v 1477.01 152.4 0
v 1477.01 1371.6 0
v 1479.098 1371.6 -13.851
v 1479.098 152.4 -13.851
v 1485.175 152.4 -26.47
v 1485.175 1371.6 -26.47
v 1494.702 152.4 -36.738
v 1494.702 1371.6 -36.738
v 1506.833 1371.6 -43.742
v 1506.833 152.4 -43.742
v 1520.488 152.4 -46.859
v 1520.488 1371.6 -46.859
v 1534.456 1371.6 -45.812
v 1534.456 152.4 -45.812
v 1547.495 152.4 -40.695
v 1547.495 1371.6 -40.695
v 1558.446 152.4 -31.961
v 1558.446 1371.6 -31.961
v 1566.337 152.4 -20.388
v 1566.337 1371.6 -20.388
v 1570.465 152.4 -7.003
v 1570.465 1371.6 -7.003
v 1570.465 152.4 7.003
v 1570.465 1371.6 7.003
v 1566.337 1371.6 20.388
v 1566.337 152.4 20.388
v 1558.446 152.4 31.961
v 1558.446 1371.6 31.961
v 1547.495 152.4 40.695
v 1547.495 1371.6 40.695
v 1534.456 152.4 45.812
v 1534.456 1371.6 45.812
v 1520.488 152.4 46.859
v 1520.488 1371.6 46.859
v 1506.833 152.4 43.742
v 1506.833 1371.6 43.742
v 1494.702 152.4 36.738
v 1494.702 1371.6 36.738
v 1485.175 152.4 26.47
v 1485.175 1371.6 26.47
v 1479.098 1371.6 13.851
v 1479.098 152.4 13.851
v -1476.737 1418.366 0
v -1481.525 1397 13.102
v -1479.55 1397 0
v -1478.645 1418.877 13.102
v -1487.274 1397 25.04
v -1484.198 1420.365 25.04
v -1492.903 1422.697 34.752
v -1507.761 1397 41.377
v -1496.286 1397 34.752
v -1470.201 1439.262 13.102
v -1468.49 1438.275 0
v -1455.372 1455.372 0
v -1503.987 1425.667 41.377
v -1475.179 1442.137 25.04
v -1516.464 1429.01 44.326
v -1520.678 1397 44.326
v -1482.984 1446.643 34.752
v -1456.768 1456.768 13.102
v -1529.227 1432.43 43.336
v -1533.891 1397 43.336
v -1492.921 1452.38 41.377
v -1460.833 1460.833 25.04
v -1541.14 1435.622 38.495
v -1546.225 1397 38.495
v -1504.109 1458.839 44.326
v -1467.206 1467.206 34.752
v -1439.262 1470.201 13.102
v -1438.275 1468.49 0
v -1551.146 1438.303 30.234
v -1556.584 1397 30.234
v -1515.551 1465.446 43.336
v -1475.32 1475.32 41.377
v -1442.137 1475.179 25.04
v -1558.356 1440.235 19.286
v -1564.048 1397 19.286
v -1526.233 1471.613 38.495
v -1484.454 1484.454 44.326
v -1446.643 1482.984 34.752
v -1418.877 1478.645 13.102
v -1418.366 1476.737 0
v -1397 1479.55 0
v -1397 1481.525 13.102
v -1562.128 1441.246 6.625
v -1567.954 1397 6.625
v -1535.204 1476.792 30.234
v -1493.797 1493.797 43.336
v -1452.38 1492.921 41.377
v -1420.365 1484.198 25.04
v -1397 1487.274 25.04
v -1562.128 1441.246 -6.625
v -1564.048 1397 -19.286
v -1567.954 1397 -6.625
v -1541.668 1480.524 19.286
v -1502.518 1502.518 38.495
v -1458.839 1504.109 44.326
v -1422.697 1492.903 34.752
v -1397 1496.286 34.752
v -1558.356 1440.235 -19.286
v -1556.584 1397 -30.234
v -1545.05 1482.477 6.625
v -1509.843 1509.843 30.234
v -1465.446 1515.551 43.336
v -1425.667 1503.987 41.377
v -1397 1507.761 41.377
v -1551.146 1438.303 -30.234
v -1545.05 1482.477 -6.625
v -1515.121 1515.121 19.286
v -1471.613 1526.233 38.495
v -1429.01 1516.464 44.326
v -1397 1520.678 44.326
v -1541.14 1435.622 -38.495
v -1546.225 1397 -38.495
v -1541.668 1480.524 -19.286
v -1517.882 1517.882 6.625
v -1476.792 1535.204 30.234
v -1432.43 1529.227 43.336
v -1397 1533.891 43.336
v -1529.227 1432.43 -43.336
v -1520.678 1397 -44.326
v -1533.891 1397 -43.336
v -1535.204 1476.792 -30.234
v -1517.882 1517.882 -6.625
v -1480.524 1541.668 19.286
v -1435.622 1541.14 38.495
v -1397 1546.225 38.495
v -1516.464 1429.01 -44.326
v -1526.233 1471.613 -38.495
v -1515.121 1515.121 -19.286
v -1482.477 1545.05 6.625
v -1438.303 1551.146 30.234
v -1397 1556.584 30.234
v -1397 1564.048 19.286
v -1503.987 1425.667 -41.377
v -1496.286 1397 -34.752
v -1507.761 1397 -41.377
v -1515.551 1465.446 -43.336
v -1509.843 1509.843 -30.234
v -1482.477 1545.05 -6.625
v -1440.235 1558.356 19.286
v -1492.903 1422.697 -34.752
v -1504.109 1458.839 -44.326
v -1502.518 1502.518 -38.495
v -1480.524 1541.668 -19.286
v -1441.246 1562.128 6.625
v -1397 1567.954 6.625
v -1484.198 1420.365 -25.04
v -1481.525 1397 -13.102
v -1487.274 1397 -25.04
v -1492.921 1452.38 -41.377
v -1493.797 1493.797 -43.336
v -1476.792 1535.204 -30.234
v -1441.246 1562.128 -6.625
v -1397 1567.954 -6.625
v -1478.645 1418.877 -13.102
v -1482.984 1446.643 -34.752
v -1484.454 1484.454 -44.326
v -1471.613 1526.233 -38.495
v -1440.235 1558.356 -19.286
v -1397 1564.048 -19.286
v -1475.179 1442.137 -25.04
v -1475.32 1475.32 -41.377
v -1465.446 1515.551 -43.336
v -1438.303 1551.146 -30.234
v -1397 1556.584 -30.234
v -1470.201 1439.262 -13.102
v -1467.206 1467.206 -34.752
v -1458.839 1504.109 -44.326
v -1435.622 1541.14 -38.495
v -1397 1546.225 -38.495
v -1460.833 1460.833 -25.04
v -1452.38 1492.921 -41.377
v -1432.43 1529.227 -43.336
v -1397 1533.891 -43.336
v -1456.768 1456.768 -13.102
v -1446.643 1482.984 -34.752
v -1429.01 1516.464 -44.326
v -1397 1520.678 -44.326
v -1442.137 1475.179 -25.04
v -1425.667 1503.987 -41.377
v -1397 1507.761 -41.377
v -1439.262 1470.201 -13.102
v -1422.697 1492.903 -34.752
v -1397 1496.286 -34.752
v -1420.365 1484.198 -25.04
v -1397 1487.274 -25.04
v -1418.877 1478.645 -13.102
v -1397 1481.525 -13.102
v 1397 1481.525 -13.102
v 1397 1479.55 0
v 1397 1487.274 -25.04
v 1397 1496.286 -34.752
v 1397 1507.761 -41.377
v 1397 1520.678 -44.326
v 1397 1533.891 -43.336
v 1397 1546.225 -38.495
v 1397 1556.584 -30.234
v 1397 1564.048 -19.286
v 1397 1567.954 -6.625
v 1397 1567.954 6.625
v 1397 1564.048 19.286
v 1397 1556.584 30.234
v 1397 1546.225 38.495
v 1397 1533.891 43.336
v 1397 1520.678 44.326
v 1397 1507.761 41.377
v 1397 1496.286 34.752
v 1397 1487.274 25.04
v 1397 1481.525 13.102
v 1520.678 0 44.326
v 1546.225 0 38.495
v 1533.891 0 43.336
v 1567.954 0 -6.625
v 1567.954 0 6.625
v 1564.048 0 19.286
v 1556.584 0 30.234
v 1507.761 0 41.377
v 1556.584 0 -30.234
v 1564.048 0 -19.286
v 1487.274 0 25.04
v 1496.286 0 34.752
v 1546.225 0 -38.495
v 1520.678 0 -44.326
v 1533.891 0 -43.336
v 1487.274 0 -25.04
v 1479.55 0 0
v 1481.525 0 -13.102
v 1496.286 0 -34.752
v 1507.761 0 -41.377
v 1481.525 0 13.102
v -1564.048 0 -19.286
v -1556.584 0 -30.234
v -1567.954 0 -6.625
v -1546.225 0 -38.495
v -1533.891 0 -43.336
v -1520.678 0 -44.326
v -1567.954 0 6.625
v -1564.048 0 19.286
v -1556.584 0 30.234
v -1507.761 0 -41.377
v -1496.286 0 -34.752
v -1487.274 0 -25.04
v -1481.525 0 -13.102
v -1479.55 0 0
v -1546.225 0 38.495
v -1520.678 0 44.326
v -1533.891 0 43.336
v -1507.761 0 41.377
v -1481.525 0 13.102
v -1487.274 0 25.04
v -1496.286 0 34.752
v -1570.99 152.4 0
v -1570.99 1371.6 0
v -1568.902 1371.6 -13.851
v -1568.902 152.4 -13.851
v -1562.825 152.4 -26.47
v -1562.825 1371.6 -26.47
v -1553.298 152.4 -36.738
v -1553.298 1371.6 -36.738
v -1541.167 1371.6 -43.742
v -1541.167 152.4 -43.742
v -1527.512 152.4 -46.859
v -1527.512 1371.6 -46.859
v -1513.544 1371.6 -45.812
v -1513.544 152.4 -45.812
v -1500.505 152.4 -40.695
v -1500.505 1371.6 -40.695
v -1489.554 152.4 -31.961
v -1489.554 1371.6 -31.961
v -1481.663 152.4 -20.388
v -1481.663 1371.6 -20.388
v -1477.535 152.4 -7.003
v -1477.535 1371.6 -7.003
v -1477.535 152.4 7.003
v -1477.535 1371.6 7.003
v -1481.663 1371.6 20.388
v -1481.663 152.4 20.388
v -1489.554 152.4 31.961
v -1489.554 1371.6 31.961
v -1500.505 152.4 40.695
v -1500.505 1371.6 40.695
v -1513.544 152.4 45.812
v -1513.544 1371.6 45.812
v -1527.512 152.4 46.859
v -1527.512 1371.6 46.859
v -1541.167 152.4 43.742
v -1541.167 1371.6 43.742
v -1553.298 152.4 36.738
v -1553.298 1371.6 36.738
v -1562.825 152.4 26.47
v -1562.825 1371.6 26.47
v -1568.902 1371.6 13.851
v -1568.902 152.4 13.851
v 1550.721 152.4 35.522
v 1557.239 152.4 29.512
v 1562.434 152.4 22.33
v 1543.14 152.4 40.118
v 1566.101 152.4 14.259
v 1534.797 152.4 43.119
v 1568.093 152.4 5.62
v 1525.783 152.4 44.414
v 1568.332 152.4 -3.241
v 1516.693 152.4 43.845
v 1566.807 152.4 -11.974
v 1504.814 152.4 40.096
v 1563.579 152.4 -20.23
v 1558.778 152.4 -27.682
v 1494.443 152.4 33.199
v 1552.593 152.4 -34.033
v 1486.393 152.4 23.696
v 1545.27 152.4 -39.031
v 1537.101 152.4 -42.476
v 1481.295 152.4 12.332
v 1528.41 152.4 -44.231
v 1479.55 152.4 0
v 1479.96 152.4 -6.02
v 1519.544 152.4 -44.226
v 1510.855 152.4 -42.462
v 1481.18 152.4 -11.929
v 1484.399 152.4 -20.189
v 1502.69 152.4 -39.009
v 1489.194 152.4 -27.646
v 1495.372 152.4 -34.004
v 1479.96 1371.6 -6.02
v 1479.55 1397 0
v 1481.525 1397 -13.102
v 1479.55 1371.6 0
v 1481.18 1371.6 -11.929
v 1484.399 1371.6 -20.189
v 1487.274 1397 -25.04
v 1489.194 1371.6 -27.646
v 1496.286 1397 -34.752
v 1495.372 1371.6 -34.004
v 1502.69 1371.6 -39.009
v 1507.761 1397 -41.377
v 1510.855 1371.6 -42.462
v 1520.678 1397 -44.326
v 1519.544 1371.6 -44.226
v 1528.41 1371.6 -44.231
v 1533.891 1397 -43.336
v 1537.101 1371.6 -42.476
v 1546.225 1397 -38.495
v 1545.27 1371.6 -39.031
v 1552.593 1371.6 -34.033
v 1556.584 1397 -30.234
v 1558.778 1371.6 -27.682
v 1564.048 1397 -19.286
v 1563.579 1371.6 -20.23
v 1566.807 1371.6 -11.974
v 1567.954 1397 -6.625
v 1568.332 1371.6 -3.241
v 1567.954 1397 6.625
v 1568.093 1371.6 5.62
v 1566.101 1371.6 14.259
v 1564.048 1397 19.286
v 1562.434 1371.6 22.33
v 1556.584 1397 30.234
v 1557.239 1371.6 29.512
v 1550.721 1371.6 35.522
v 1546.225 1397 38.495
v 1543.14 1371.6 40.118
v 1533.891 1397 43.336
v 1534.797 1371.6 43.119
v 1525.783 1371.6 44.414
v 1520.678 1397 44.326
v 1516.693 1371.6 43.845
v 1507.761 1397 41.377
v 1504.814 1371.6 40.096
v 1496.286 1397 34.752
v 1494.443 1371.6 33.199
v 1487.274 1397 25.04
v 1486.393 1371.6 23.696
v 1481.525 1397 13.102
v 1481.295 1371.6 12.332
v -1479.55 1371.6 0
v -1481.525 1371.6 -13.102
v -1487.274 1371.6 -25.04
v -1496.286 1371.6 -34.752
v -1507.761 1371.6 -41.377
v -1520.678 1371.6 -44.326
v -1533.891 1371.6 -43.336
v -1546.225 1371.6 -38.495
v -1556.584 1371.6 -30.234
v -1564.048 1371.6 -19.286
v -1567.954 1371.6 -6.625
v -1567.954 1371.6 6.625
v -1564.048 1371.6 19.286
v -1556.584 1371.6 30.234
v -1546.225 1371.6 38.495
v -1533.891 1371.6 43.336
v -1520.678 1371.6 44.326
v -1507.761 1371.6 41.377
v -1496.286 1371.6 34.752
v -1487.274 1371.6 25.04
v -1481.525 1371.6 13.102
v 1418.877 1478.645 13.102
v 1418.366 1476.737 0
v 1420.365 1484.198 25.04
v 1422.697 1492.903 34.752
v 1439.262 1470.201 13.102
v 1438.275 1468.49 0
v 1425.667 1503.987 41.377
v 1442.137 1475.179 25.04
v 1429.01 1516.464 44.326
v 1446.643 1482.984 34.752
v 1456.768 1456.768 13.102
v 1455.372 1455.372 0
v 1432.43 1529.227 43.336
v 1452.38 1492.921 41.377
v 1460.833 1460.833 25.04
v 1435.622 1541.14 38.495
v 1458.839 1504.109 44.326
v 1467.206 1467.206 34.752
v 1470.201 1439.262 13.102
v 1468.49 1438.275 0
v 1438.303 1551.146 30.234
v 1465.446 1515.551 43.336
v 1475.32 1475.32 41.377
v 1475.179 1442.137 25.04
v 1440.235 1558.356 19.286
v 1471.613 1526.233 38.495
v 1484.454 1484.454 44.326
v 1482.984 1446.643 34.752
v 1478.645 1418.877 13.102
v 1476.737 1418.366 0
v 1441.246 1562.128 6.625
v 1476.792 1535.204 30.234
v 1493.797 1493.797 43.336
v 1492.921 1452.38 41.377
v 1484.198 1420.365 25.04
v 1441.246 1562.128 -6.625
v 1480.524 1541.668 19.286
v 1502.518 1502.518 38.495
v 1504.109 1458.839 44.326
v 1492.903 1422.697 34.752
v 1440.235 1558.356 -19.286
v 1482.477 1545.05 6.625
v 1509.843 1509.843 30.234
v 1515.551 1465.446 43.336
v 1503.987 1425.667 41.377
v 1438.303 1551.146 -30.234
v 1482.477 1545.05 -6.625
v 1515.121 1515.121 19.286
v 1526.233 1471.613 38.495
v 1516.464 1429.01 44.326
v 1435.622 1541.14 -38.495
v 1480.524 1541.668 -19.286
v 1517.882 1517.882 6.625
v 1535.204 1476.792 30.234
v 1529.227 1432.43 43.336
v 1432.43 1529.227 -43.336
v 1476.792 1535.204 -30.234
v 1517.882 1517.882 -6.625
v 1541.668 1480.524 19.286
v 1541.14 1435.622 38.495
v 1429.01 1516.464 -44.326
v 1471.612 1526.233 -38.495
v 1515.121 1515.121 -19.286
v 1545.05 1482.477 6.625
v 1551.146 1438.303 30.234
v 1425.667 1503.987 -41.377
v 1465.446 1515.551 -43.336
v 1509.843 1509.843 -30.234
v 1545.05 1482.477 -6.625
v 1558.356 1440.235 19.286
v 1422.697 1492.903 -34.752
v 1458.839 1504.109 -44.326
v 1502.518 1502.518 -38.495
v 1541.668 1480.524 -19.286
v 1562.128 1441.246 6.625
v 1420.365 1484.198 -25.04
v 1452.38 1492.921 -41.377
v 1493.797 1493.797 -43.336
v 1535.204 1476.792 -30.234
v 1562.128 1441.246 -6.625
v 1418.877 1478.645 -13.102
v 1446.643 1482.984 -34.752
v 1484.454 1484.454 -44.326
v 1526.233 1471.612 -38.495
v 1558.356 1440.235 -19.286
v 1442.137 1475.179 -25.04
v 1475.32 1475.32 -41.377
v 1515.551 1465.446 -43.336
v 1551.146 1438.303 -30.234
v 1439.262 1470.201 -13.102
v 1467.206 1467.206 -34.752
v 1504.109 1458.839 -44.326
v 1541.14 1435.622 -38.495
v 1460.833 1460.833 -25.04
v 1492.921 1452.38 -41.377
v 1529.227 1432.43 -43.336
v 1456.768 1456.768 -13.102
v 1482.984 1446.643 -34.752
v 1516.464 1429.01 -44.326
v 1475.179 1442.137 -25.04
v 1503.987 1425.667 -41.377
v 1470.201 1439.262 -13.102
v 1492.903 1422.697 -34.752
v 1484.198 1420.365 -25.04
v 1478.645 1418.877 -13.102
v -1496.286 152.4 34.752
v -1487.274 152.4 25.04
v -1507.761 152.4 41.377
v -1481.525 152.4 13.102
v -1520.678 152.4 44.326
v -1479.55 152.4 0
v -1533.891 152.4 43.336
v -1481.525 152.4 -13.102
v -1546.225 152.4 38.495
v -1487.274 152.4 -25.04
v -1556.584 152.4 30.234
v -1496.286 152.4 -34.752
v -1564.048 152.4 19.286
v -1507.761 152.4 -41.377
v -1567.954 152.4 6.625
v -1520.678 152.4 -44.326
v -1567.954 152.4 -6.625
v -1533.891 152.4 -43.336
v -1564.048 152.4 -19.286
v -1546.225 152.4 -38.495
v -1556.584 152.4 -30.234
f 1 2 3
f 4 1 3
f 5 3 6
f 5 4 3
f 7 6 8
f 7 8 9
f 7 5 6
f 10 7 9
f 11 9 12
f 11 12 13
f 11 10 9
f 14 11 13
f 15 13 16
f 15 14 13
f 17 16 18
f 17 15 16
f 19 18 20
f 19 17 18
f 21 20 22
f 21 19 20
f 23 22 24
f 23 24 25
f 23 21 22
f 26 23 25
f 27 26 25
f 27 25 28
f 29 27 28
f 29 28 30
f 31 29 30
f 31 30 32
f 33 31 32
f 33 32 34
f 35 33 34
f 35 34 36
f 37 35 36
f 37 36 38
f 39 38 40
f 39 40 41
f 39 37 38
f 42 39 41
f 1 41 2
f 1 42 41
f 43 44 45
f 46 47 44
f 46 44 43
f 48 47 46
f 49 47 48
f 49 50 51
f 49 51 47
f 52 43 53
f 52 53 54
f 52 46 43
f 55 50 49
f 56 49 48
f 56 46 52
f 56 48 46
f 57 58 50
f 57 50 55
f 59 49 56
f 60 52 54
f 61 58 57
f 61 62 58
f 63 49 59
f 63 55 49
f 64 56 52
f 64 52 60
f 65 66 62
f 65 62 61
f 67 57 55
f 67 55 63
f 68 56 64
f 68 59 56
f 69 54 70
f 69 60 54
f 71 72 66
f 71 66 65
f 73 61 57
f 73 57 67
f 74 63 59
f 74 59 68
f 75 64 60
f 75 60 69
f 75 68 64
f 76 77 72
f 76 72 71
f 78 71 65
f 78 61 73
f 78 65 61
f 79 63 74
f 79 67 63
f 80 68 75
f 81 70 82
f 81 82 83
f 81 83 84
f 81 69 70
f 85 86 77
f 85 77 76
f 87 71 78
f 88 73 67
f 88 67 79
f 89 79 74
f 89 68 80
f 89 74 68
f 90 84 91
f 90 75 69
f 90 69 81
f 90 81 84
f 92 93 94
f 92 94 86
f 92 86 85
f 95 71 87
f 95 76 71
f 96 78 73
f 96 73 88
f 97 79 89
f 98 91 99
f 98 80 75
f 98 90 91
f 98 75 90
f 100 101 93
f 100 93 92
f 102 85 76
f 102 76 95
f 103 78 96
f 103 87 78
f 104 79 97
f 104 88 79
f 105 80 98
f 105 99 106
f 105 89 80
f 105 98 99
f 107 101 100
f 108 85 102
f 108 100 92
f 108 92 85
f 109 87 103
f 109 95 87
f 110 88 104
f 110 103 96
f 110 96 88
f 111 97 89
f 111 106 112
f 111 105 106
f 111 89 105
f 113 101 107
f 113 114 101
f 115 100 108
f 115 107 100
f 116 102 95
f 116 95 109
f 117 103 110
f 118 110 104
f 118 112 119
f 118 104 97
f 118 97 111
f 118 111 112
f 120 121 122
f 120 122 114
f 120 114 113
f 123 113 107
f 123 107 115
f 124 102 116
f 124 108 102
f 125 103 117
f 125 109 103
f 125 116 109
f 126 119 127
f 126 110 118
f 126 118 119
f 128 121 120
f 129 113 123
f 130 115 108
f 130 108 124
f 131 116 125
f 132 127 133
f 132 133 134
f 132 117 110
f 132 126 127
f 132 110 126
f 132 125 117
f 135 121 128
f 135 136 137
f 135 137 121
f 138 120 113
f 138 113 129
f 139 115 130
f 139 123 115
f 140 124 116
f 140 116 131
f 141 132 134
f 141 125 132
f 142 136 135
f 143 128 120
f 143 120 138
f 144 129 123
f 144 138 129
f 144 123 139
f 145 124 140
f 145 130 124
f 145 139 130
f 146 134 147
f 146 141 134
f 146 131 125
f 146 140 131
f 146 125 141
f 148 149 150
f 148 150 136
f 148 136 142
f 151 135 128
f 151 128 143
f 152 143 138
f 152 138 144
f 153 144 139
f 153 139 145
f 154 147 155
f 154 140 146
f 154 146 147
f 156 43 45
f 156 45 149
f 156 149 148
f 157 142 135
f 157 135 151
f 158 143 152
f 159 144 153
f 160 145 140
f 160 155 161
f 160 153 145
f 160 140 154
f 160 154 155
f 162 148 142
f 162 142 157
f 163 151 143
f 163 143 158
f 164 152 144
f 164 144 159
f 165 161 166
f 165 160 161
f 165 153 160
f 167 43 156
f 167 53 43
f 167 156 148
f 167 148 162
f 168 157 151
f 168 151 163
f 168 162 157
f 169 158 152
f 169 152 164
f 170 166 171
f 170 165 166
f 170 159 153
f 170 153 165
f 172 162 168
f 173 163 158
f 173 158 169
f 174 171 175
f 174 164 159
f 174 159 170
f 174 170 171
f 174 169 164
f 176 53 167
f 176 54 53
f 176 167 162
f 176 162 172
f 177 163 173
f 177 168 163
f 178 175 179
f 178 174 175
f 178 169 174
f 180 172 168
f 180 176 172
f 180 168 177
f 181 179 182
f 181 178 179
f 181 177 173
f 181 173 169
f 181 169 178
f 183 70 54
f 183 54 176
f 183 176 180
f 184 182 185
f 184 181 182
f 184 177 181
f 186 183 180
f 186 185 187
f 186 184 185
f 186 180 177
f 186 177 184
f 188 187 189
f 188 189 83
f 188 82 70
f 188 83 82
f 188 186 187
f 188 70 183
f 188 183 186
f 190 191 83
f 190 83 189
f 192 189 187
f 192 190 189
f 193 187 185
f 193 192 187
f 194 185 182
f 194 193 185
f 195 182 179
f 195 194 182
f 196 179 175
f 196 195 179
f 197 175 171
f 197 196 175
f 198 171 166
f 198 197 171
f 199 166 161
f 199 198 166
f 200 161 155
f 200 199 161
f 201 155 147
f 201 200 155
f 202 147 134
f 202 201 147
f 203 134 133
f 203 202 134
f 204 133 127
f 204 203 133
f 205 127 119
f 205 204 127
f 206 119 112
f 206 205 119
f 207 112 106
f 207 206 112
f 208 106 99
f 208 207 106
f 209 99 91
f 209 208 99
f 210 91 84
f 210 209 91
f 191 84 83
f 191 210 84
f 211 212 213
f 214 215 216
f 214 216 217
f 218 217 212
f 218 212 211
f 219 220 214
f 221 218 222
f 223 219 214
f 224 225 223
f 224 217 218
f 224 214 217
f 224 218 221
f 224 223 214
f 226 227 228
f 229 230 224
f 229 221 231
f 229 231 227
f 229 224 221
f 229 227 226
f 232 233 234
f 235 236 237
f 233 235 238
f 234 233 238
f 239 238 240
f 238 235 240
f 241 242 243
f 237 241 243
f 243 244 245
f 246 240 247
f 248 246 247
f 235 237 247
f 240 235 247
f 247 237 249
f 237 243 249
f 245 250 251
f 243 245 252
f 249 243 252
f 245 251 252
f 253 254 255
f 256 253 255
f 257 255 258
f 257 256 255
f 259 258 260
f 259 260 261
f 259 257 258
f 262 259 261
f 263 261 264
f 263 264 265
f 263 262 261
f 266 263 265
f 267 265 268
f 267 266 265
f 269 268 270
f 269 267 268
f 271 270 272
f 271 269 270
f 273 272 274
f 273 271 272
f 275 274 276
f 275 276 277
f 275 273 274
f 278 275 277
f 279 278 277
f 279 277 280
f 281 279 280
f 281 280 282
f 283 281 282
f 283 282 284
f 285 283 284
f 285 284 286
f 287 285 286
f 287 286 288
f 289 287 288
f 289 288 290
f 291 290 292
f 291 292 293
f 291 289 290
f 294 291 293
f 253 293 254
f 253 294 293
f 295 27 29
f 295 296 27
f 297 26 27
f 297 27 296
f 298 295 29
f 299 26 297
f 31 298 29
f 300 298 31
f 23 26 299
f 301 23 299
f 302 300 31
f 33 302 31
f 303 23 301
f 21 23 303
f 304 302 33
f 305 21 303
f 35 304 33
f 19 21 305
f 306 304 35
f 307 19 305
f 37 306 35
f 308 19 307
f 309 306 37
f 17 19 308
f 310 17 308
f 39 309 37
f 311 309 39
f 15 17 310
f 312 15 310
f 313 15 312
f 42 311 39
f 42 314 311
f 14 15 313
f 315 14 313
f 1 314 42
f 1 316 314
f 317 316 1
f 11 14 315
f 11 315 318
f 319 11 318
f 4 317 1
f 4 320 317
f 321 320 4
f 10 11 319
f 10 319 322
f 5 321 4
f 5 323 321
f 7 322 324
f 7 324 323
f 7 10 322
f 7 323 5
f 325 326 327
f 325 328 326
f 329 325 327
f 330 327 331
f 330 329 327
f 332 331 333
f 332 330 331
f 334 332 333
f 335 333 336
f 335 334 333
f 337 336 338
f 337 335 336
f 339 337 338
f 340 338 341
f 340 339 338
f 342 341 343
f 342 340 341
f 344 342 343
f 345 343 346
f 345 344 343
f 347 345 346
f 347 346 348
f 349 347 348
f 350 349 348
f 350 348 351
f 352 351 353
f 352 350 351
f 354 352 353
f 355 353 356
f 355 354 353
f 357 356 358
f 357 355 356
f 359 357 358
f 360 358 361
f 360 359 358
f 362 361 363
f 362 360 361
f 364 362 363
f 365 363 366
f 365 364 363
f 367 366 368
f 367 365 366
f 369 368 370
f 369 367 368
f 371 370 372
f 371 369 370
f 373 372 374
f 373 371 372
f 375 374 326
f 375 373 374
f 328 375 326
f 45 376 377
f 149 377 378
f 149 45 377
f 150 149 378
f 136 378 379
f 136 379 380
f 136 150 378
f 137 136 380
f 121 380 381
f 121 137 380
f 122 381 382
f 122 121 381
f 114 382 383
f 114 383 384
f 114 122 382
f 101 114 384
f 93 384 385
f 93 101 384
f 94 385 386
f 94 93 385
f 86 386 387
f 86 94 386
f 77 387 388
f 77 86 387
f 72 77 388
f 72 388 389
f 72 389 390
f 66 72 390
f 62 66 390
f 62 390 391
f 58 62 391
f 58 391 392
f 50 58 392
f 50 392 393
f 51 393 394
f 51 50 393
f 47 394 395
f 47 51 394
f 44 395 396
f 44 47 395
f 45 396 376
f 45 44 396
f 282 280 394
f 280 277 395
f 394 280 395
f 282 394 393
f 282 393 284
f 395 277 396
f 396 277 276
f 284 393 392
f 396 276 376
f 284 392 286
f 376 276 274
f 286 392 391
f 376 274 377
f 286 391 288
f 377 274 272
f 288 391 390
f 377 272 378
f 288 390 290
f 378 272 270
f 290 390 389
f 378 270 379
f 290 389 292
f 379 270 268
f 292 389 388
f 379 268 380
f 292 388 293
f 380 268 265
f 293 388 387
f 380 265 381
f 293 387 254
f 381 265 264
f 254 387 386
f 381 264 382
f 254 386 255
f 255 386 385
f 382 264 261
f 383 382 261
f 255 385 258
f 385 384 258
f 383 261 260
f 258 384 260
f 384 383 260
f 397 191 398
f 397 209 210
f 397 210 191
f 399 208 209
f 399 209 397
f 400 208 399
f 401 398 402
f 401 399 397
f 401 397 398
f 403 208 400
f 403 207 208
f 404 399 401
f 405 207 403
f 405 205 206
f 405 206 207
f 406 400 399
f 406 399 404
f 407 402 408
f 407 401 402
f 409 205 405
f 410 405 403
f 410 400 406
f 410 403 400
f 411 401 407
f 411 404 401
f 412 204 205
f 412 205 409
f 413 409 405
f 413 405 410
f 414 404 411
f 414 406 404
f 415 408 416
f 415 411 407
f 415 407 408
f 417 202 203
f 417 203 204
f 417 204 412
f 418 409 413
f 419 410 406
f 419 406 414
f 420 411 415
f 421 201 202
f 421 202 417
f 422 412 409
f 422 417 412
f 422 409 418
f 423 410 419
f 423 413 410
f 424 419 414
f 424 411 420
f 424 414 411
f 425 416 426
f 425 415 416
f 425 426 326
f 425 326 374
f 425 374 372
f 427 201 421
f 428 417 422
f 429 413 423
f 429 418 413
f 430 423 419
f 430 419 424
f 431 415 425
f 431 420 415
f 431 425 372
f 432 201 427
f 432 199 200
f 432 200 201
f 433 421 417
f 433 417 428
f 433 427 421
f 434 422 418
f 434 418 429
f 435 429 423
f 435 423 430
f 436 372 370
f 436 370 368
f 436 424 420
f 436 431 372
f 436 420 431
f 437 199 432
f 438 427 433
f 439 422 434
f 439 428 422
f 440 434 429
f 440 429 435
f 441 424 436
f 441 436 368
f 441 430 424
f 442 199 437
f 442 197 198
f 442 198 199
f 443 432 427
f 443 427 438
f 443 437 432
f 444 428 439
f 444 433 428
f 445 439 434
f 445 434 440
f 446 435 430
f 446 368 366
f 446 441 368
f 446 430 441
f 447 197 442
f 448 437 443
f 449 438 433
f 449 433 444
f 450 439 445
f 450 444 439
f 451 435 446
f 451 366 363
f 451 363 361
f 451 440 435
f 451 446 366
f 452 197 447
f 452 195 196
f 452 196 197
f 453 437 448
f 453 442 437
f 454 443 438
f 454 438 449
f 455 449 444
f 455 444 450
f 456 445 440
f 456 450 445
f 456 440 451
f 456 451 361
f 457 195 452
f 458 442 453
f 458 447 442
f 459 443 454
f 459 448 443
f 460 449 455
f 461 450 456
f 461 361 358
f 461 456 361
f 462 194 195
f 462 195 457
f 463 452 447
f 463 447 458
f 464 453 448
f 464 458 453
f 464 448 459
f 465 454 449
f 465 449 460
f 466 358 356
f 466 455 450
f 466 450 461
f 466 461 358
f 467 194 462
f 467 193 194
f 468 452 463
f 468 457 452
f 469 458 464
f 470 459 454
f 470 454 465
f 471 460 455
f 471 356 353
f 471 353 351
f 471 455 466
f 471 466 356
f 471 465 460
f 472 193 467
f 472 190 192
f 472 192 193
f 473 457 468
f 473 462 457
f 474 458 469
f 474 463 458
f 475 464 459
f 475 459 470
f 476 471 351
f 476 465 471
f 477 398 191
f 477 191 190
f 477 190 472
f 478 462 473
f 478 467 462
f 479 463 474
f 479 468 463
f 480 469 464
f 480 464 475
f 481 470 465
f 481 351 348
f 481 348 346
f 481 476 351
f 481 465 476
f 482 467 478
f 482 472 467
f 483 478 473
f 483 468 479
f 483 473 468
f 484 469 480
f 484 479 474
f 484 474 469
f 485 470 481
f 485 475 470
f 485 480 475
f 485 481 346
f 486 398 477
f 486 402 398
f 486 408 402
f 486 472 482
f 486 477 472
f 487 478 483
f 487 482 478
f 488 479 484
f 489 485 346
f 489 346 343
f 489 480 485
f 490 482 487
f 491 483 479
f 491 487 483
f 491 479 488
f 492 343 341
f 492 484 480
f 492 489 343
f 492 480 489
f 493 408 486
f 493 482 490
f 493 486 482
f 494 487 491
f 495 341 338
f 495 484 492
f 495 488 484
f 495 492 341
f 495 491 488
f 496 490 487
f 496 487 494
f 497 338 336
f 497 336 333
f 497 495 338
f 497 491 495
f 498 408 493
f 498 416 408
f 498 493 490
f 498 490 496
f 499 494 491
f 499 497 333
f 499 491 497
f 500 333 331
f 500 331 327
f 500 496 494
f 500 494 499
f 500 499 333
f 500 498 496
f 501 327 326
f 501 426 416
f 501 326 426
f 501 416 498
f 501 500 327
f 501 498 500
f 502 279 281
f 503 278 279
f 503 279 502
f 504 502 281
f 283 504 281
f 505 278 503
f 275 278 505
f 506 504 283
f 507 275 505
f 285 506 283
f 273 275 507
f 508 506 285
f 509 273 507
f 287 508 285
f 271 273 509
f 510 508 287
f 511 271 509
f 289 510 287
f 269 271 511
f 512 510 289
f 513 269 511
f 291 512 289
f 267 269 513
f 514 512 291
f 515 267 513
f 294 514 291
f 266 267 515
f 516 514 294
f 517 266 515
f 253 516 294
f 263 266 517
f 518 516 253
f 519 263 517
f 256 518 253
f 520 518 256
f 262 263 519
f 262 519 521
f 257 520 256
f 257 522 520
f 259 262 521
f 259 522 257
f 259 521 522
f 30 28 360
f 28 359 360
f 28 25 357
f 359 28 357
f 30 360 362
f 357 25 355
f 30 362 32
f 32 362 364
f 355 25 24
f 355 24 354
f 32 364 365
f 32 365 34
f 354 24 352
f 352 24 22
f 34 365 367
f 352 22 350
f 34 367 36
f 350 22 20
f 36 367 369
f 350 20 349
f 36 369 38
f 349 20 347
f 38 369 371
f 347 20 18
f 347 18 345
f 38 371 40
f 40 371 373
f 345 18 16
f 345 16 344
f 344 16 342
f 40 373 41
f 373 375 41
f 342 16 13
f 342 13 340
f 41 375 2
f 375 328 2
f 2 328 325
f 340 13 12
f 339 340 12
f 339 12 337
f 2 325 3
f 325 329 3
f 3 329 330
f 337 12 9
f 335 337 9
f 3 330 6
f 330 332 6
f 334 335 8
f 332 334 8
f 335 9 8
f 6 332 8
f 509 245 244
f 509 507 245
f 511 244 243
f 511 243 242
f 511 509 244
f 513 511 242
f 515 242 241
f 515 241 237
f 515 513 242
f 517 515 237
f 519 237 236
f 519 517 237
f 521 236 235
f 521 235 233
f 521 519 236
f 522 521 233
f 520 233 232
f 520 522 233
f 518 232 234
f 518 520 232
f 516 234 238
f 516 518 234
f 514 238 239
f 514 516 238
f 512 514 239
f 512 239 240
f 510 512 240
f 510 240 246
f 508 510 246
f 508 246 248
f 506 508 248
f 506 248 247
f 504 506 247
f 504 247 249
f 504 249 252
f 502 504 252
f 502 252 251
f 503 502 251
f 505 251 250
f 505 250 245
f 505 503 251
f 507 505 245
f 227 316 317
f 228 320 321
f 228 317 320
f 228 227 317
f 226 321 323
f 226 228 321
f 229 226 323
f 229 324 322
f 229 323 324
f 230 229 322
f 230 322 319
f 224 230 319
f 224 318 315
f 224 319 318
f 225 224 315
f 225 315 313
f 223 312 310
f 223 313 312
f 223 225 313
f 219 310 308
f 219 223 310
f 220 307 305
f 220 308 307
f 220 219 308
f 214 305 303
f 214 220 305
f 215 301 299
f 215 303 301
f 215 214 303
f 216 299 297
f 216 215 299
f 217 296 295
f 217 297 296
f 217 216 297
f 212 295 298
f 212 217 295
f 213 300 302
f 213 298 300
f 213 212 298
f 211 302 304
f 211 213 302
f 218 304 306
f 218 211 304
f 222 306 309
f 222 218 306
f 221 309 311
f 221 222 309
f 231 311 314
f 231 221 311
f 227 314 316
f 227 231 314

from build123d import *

# Parameters (mm, degrees)
SKETCH2_R           = 44.45
SKETCH3_R           = 46.99
BOSS_EXTRUDE1_DEPTH = 1219.2


with BuildPart() as part:
    # Sweep1: sweep along a path in Sketch1
    with BuildLine(Plane.XY) as sweep1_path:
        Line((-1524, 0), (-1524, 1397))
        ThreePointArc((-1524, 1397), (-1486.802561211, 1486.802561211), (-1397, 1524))
        Line((-1397, 1524), (1397, 1524))
        ThreePointArc((1397, 1524), (1486.802561211, 1486.802561211), (1524, 1397))
        Line((1524, 1397), (1524, 0))
    # Sketch2 → Sweep1 (sweep)
    with BuildSketch(Plane(origin=(0, 0, 0), x_dir=(1, 0, 0), z_dir=(0, 1, 0))):
        with Locations((-1524, 0)):
            Circle(SKETCH2_R)
    sweep(path=sweep1_path.line)

    # Sketch3 → Boss-Extrude1 (add)
    with BuildSketch(Plane(origin=(0, 152.4, 0), x_dir=(-1, 0, 0), z_dir=(0, -1, 0))):
        with Locations((-1524, 0)):
            Circle(SKETCH3_R)
        with Locations((1524, 0)):
            Circle(SKETCH3_R)
    extrude(amount=-BOSS_EXTRUDE1_DEPTH)


solid = part.part
